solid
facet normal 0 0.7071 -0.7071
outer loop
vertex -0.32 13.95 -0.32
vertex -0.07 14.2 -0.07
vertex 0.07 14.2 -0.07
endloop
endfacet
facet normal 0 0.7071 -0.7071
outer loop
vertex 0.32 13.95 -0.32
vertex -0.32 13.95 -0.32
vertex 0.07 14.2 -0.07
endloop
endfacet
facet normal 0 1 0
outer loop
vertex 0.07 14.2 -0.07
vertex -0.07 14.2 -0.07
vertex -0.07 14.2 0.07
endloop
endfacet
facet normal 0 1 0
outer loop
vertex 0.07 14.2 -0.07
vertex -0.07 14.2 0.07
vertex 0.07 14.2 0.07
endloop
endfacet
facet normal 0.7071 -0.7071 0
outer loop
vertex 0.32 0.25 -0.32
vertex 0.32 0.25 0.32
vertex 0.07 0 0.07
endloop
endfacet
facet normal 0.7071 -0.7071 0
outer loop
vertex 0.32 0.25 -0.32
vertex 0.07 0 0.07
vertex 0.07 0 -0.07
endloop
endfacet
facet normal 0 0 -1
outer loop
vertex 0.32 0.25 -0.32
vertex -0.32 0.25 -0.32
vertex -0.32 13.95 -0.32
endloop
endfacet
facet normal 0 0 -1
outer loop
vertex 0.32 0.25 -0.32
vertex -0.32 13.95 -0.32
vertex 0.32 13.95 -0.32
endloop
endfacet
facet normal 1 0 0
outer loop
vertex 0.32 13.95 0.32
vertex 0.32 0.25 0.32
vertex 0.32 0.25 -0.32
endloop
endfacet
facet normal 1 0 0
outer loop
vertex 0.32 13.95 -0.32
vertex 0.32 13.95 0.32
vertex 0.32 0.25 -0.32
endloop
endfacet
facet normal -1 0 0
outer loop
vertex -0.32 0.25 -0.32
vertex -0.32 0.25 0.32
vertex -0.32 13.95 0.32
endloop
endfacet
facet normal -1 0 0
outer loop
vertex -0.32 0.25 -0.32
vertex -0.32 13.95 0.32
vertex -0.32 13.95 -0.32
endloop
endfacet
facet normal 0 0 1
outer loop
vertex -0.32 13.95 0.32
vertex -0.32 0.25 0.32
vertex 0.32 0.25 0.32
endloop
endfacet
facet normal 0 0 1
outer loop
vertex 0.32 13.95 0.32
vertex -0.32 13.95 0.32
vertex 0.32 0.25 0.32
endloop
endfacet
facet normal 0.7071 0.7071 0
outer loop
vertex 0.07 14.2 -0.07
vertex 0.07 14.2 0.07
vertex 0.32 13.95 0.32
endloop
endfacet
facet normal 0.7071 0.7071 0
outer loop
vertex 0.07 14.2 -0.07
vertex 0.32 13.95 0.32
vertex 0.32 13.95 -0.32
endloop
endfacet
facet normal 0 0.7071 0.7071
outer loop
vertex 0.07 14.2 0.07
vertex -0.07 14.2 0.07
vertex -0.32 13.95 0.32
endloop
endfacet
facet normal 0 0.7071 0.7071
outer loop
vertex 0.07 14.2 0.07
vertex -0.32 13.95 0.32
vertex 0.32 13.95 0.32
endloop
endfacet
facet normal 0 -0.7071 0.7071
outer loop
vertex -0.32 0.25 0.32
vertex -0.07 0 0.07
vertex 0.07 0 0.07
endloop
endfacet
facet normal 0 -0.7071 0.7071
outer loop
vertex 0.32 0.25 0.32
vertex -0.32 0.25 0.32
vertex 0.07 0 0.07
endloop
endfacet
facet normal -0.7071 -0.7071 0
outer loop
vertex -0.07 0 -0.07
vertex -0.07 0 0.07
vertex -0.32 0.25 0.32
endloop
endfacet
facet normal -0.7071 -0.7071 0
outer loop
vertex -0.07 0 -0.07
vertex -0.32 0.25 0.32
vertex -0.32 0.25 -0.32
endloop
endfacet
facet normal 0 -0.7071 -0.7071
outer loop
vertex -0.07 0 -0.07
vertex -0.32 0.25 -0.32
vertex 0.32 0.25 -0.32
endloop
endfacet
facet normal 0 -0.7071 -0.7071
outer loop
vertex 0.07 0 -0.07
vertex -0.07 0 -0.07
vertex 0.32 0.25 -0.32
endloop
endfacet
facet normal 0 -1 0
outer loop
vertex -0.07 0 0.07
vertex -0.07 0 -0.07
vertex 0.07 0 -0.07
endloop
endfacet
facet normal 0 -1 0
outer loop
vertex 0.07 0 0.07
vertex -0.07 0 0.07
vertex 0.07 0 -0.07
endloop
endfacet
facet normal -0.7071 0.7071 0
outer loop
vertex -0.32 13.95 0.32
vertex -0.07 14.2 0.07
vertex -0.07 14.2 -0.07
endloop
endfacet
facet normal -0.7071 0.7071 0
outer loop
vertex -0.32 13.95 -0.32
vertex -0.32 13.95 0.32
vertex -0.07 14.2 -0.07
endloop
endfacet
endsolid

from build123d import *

# Parameters (mm, degrees)
SZKIC1_W                    = 0.64
SZKIC1_H                    = 0.64
DODANIE_WYCI_GNI_CIE1_DEPTH = 14.2
SFAZOWANIE1_SIZE            = 0.25
SFAZOWANIE2_SIZE            = 0.25


with BuildPart() as part:
    # Szkic1 → Dodanie-wyciągnięcie1 (new body)
    with BuildSketch(Plane(origin=(0, 0, 0), x_dir=(1, 0, 0), z_dir=(0, 1, 0))):
        Rectangle(SZKIC1_W, SZKIC1_H)
    extrude(amount=DODANIE_WYCI_GNI_CIE1_DEPTH)

    # Sfazowanie1
    sfazowanie1_edges = [part.edges().sort_by_distance(p)[0] for p in [
        (0.32, 14.2, 0),
        (0, 14.2, -0.32),
        (-0.32, 14.2, 0),
        (0, 14.2, 0.32),
    ]]
    chamfer(sfazowanie1_edges, length=SFAZOWANIE1_SIZE)

    # Sfazowanie2
    sfazowanie2_edges = [part.edges().sort_by_distance(p)[0] for p in [
        (0, 0, -0.32),
        (0.32, 0, 0),
        (0, 0, 0.32),
        (-0.32, 0, 0),
    ]]
    chamfer(sfazowanie2_edges, length=SFAZOWANIE2_SIZE)


solid = part.part
